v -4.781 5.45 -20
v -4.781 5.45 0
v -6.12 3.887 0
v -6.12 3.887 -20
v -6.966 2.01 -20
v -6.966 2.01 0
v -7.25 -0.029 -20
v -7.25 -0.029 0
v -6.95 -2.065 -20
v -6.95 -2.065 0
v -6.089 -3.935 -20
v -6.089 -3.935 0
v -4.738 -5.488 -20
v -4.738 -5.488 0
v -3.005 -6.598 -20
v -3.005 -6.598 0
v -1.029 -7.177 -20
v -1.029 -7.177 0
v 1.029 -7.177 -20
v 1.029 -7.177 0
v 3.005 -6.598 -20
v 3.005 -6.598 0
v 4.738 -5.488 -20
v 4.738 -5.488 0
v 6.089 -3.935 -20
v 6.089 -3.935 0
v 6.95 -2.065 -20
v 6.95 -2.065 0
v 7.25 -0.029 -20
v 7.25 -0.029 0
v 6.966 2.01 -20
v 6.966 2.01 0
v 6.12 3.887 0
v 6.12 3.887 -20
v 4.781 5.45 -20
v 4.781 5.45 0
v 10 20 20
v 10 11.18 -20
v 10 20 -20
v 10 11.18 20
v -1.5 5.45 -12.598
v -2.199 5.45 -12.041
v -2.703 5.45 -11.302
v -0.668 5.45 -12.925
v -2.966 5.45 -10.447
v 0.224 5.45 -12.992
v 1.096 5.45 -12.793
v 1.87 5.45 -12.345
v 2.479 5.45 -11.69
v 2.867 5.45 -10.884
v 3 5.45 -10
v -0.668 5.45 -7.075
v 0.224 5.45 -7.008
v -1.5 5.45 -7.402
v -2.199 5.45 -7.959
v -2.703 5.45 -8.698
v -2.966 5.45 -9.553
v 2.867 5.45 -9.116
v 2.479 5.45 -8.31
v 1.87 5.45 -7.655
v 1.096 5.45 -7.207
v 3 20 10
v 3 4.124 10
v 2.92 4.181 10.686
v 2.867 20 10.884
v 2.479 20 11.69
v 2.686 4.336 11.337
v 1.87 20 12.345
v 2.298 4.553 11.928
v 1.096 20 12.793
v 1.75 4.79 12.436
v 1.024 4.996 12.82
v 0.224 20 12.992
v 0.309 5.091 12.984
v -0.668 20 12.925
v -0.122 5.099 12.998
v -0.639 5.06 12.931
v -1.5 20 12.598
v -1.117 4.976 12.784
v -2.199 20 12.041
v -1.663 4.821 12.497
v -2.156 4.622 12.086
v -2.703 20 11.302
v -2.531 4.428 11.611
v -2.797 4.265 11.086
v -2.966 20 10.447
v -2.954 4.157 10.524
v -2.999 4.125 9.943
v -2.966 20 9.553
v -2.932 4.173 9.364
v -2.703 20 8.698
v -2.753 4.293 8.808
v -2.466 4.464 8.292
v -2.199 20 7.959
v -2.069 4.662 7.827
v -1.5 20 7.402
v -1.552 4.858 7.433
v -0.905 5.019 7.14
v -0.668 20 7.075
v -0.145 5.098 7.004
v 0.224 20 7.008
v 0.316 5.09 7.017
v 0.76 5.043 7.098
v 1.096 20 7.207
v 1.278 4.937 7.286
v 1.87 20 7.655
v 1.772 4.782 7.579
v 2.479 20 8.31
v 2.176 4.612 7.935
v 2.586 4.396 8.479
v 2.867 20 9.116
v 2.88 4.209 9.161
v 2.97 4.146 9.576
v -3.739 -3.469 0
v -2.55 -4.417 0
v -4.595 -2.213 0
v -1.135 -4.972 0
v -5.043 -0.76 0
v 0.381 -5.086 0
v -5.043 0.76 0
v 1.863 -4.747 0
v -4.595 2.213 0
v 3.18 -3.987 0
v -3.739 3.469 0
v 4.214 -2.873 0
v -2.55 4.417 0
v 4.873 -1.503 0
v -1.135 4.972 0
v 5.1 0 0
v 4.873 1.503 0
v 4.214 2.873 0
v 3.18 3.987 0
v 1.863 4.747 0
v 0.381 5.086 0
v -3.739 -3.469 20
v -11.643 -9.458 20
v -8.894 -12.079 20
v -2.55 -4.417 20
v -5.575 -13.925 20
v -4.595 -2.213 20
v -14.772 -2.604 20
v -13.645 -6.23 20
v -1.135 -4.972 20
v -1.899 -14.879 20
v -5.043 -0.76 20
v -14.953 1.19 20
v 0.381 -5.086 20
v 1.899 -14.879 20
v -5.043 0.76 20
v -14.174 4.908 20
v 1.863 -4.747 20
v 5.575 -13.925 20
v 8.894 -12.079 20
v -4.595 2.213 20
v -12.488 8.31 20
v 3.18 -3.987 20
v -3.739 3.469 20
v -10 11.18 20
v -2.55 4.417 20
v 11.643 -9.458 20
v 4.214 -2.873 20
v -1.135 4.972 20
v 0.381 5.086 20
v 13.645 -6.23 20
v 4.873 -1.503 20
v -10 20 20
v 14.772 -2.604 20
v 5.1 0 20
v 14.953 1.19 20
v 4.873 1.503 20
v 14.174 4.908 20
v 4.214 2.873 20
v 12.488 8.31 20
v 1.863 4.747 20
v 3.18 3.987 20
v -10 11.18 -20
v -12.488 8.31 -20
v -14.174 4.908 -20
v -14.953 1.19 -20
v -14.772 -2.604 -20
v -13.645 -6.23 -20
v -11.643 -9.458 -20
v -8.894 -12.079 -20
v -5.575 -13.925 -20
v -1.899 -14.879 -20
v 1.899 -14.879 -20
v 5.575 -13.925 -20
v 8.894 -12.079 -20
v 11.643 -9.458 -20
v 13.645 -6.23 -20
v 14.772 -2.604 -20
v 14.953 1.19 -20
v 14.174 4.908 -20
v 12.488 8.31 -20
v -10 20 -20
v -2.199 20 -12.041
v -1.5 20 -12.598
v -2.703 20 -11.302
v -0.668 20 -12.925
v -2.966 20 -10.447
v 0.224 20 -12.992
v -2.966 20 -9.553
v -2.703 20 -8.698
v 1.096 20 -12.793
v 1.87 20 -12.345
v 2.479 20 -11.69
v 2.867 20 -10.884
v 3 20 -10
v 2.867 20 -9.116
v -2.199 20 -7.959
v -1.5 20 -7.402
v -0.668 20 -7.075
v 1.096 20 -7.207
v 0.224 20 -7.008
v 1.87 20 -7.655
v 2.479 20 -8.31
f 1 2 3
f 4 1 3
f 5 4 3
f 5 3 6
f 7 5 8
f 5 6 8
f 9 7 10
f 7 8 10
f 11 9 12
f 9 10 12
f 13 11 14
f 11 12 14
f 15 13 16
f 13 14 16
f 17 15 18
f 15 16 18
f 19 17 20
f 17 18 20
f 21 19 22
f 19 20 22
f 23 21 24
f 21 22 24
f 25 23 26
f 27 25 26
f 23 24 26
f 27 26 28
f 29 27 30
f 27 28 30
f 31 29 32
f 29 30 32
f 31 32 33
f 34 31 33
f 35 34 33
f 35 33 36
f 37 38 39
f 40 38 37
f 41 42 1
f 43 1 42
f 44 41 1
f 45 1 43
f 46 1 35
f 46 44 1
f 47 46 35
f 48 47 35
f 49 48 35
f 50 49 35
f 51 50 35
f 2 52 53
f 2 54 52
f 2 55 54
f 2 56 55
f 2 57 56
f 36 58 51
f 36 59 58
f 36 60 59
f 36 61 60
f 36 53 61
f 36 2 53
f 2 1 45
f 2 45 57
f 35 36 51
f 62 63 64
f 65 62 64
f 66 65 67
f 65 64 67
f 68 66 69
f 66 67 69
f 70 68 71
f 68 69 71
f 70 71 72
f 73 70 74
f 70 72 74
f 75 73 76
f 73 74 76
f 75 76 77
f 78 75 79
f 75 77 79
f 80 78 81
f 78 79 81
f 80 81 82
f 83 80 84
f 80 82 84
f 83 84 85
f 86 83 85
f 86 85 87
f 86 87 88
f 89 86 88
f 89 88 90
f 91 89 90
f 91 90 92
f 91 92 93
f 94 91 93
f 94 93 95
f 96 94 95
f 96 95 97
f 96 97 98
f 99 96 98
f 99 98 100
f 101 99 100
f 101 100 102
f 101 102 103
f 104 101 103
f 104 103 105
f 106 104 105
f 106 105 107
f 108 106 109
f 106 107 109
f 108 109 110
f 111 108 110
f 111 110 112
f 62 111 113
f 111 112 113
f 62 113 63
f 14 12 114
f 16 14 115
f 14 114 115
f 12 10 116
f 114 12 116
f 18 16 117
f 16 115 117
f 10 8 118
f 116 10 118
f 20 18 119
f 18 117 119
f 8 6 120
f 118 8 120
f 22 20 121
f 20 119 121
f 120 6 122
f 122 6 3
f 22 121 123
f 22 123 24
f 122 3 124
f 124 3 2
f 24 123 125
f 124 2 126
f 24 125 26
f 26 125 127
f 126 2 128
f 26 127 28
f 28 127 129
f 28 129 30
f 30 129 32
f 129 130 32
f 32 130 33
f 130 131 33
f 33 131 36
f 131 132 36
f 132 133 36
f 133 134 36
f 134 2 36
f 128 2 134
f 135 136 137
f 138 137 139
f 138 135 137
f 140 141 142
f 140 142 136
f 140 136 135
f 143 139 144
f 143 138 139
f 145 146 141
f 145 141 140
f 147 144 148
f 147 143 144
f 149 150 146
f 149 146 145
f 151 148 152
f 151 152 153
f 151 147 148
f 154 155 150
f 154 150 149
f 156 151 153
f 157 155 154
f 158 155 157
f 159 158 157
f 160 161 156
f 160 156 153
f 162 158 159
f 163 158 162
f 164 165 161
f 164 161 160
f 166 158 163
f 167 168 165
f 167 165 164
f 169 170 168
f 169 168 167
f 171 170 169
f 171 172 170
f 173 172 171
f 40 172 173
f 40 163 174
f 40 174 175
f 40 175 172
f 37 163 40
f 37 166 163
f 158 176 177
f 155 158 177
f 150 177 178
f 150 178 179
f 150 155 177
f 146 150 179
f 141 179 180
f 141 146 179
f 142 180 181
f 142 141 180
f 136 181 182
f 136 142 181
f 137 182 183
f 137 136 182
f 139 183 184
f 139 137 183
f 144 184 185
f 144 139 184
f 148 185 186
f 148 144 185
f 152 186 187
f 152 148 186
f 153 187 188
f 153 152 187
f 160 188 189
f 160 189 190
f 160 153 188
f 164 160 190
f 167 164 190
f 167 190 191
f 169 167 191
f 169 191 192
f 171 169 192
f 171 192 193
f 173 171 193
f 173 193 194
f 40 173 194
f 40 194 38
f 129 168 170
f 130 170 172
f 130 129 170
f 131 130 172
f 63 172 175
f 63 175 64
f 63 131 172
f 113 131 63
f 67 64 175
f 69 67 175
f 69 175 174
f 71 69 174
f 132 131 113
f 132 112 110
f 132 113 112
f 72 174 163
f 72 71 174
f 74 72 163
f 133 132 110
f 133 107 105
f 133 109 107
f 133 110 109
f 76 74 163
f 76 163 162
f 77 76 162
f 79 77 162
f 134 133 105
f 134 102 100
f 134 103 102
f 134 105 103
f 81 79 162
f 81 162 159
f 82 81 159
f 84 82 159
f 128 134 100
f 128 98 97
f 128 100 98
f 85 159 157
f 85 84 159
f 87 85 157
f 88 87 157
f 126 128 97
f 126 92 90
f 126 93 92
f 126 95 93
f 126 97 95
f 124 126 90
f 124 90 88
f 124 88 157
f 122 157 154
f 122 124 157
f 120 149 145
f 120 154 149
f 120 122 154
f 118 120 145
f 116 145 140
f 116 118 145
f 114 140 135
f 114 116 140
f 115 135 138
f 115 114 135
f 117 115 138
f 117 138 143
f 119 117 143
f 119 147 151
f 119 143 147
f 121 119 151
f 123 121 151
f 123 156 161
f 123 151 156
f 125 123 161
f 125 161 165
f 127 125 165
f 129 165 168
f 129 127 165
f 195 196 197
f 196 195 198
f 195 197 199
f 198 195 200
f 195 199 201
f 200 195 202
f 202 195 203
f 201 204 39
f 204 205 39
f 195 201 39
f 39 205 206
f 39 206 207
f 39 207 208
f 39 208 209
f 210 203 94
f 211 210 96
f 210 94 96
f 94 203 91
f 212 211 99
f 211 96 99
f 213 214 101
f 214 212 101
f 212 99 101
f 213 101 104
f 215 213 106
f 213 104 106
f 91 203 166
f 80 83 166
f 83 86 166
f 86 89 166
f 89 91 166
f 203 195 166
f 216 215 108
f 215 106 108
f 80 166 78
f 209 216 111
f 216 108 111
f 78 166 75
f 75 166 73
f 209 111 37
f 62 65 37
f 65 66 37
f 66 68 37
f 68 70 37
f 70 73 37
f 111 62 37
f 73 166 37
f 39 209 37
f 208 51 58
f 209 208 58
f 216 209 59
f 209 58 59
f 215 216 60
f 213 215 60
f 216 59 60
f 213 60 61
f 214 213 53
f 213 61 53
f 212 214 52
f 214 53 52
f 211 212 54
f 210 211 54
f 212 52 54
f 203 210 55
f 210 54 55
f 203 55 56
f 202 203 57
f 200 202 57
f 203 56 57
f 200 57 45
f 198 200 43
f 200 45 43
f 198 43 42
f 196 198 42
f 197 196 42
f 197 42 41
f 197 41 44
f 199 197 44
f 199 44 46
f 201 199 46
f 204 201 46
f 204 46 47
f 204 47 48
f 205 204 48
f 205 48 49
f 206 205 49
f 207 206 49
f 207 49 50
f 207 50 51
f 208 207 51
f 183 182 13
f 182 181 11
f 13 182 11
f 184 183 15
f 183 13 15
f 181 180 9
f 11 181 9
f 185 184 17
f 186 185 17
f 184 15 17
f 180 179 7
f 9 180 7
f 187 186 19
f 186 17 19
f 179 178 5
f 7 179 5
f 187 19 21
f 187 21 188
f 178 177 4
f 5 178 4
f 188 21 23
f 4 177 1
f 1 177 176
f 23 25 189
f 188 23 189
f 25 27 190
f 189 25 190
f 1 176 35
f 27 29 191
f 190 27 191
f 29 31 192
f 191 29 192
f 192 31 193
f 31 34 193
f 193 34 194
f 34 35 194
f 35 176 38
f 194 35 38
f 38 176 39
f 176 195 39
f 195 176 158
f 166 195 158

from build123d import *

# Parameters (mm, degrees)
SKETCH_R        = 15
PAD_DEPTH       = 20
SKETCH003_W     = 20
SKETCH003_H     = 40
PAD002_DEPTH    = 20
SKETCH002_R     = 3
POCKET_DEPTH    = 20.001
POCKET001_DEPTH = 20.001
SKETCH005_R     = 5.1
POCKET002_DEPTH = 20.001


with BuildPart() as part:
    # Sketch → Pad (new body, symmetric)
    with BuildSketch(Plane.XY):
        Circle(SKETCH_R)
    extrude(amount=PAD_DEPTH, both=True)

    # Sketch003 → Pad002 (join)
    with BuildSketch(Plane.XZ):
        Rectangle(SKETCH003_W, SKETCH003_H)
    extrude(amount=-PAD002_DEPTH)

    # Sketch002 → Pocket (cut, through all)
    with BuildSketch(Plane.XZ):
        with Locations((0, 10)):
            Circle(SKETCH002_R)
        with Locations((0, -10)):
            Circle(SKETCH002_R)
    extrude(amount=-POCKET_DEPTH, mode=Mode.SUBTRACT)

    # Sketch004 → Pocket001 (cut, through all)
    with BuildSketch(Plane.XY):
        with BuildLine():
            ThreePointArc((-4.781213, 5.45), (0, -7.25), (4.781213, 5.45))
            Line((-4.781213, 5.45), (4.781213, 5.45))
        make_face()
    extrude(amount=-POCKET001_DEPTH, mode=Mode.SUBTRACT)

    # Sketch005 → Pocket002 (cut, through all)
    with BuildSketch(Plane.XY):
        Circle(SKETCH005_R)
    extrude(amount=POCKET002_DEPTH, mode=Mode.SUBTRACT)


solid = part.part
